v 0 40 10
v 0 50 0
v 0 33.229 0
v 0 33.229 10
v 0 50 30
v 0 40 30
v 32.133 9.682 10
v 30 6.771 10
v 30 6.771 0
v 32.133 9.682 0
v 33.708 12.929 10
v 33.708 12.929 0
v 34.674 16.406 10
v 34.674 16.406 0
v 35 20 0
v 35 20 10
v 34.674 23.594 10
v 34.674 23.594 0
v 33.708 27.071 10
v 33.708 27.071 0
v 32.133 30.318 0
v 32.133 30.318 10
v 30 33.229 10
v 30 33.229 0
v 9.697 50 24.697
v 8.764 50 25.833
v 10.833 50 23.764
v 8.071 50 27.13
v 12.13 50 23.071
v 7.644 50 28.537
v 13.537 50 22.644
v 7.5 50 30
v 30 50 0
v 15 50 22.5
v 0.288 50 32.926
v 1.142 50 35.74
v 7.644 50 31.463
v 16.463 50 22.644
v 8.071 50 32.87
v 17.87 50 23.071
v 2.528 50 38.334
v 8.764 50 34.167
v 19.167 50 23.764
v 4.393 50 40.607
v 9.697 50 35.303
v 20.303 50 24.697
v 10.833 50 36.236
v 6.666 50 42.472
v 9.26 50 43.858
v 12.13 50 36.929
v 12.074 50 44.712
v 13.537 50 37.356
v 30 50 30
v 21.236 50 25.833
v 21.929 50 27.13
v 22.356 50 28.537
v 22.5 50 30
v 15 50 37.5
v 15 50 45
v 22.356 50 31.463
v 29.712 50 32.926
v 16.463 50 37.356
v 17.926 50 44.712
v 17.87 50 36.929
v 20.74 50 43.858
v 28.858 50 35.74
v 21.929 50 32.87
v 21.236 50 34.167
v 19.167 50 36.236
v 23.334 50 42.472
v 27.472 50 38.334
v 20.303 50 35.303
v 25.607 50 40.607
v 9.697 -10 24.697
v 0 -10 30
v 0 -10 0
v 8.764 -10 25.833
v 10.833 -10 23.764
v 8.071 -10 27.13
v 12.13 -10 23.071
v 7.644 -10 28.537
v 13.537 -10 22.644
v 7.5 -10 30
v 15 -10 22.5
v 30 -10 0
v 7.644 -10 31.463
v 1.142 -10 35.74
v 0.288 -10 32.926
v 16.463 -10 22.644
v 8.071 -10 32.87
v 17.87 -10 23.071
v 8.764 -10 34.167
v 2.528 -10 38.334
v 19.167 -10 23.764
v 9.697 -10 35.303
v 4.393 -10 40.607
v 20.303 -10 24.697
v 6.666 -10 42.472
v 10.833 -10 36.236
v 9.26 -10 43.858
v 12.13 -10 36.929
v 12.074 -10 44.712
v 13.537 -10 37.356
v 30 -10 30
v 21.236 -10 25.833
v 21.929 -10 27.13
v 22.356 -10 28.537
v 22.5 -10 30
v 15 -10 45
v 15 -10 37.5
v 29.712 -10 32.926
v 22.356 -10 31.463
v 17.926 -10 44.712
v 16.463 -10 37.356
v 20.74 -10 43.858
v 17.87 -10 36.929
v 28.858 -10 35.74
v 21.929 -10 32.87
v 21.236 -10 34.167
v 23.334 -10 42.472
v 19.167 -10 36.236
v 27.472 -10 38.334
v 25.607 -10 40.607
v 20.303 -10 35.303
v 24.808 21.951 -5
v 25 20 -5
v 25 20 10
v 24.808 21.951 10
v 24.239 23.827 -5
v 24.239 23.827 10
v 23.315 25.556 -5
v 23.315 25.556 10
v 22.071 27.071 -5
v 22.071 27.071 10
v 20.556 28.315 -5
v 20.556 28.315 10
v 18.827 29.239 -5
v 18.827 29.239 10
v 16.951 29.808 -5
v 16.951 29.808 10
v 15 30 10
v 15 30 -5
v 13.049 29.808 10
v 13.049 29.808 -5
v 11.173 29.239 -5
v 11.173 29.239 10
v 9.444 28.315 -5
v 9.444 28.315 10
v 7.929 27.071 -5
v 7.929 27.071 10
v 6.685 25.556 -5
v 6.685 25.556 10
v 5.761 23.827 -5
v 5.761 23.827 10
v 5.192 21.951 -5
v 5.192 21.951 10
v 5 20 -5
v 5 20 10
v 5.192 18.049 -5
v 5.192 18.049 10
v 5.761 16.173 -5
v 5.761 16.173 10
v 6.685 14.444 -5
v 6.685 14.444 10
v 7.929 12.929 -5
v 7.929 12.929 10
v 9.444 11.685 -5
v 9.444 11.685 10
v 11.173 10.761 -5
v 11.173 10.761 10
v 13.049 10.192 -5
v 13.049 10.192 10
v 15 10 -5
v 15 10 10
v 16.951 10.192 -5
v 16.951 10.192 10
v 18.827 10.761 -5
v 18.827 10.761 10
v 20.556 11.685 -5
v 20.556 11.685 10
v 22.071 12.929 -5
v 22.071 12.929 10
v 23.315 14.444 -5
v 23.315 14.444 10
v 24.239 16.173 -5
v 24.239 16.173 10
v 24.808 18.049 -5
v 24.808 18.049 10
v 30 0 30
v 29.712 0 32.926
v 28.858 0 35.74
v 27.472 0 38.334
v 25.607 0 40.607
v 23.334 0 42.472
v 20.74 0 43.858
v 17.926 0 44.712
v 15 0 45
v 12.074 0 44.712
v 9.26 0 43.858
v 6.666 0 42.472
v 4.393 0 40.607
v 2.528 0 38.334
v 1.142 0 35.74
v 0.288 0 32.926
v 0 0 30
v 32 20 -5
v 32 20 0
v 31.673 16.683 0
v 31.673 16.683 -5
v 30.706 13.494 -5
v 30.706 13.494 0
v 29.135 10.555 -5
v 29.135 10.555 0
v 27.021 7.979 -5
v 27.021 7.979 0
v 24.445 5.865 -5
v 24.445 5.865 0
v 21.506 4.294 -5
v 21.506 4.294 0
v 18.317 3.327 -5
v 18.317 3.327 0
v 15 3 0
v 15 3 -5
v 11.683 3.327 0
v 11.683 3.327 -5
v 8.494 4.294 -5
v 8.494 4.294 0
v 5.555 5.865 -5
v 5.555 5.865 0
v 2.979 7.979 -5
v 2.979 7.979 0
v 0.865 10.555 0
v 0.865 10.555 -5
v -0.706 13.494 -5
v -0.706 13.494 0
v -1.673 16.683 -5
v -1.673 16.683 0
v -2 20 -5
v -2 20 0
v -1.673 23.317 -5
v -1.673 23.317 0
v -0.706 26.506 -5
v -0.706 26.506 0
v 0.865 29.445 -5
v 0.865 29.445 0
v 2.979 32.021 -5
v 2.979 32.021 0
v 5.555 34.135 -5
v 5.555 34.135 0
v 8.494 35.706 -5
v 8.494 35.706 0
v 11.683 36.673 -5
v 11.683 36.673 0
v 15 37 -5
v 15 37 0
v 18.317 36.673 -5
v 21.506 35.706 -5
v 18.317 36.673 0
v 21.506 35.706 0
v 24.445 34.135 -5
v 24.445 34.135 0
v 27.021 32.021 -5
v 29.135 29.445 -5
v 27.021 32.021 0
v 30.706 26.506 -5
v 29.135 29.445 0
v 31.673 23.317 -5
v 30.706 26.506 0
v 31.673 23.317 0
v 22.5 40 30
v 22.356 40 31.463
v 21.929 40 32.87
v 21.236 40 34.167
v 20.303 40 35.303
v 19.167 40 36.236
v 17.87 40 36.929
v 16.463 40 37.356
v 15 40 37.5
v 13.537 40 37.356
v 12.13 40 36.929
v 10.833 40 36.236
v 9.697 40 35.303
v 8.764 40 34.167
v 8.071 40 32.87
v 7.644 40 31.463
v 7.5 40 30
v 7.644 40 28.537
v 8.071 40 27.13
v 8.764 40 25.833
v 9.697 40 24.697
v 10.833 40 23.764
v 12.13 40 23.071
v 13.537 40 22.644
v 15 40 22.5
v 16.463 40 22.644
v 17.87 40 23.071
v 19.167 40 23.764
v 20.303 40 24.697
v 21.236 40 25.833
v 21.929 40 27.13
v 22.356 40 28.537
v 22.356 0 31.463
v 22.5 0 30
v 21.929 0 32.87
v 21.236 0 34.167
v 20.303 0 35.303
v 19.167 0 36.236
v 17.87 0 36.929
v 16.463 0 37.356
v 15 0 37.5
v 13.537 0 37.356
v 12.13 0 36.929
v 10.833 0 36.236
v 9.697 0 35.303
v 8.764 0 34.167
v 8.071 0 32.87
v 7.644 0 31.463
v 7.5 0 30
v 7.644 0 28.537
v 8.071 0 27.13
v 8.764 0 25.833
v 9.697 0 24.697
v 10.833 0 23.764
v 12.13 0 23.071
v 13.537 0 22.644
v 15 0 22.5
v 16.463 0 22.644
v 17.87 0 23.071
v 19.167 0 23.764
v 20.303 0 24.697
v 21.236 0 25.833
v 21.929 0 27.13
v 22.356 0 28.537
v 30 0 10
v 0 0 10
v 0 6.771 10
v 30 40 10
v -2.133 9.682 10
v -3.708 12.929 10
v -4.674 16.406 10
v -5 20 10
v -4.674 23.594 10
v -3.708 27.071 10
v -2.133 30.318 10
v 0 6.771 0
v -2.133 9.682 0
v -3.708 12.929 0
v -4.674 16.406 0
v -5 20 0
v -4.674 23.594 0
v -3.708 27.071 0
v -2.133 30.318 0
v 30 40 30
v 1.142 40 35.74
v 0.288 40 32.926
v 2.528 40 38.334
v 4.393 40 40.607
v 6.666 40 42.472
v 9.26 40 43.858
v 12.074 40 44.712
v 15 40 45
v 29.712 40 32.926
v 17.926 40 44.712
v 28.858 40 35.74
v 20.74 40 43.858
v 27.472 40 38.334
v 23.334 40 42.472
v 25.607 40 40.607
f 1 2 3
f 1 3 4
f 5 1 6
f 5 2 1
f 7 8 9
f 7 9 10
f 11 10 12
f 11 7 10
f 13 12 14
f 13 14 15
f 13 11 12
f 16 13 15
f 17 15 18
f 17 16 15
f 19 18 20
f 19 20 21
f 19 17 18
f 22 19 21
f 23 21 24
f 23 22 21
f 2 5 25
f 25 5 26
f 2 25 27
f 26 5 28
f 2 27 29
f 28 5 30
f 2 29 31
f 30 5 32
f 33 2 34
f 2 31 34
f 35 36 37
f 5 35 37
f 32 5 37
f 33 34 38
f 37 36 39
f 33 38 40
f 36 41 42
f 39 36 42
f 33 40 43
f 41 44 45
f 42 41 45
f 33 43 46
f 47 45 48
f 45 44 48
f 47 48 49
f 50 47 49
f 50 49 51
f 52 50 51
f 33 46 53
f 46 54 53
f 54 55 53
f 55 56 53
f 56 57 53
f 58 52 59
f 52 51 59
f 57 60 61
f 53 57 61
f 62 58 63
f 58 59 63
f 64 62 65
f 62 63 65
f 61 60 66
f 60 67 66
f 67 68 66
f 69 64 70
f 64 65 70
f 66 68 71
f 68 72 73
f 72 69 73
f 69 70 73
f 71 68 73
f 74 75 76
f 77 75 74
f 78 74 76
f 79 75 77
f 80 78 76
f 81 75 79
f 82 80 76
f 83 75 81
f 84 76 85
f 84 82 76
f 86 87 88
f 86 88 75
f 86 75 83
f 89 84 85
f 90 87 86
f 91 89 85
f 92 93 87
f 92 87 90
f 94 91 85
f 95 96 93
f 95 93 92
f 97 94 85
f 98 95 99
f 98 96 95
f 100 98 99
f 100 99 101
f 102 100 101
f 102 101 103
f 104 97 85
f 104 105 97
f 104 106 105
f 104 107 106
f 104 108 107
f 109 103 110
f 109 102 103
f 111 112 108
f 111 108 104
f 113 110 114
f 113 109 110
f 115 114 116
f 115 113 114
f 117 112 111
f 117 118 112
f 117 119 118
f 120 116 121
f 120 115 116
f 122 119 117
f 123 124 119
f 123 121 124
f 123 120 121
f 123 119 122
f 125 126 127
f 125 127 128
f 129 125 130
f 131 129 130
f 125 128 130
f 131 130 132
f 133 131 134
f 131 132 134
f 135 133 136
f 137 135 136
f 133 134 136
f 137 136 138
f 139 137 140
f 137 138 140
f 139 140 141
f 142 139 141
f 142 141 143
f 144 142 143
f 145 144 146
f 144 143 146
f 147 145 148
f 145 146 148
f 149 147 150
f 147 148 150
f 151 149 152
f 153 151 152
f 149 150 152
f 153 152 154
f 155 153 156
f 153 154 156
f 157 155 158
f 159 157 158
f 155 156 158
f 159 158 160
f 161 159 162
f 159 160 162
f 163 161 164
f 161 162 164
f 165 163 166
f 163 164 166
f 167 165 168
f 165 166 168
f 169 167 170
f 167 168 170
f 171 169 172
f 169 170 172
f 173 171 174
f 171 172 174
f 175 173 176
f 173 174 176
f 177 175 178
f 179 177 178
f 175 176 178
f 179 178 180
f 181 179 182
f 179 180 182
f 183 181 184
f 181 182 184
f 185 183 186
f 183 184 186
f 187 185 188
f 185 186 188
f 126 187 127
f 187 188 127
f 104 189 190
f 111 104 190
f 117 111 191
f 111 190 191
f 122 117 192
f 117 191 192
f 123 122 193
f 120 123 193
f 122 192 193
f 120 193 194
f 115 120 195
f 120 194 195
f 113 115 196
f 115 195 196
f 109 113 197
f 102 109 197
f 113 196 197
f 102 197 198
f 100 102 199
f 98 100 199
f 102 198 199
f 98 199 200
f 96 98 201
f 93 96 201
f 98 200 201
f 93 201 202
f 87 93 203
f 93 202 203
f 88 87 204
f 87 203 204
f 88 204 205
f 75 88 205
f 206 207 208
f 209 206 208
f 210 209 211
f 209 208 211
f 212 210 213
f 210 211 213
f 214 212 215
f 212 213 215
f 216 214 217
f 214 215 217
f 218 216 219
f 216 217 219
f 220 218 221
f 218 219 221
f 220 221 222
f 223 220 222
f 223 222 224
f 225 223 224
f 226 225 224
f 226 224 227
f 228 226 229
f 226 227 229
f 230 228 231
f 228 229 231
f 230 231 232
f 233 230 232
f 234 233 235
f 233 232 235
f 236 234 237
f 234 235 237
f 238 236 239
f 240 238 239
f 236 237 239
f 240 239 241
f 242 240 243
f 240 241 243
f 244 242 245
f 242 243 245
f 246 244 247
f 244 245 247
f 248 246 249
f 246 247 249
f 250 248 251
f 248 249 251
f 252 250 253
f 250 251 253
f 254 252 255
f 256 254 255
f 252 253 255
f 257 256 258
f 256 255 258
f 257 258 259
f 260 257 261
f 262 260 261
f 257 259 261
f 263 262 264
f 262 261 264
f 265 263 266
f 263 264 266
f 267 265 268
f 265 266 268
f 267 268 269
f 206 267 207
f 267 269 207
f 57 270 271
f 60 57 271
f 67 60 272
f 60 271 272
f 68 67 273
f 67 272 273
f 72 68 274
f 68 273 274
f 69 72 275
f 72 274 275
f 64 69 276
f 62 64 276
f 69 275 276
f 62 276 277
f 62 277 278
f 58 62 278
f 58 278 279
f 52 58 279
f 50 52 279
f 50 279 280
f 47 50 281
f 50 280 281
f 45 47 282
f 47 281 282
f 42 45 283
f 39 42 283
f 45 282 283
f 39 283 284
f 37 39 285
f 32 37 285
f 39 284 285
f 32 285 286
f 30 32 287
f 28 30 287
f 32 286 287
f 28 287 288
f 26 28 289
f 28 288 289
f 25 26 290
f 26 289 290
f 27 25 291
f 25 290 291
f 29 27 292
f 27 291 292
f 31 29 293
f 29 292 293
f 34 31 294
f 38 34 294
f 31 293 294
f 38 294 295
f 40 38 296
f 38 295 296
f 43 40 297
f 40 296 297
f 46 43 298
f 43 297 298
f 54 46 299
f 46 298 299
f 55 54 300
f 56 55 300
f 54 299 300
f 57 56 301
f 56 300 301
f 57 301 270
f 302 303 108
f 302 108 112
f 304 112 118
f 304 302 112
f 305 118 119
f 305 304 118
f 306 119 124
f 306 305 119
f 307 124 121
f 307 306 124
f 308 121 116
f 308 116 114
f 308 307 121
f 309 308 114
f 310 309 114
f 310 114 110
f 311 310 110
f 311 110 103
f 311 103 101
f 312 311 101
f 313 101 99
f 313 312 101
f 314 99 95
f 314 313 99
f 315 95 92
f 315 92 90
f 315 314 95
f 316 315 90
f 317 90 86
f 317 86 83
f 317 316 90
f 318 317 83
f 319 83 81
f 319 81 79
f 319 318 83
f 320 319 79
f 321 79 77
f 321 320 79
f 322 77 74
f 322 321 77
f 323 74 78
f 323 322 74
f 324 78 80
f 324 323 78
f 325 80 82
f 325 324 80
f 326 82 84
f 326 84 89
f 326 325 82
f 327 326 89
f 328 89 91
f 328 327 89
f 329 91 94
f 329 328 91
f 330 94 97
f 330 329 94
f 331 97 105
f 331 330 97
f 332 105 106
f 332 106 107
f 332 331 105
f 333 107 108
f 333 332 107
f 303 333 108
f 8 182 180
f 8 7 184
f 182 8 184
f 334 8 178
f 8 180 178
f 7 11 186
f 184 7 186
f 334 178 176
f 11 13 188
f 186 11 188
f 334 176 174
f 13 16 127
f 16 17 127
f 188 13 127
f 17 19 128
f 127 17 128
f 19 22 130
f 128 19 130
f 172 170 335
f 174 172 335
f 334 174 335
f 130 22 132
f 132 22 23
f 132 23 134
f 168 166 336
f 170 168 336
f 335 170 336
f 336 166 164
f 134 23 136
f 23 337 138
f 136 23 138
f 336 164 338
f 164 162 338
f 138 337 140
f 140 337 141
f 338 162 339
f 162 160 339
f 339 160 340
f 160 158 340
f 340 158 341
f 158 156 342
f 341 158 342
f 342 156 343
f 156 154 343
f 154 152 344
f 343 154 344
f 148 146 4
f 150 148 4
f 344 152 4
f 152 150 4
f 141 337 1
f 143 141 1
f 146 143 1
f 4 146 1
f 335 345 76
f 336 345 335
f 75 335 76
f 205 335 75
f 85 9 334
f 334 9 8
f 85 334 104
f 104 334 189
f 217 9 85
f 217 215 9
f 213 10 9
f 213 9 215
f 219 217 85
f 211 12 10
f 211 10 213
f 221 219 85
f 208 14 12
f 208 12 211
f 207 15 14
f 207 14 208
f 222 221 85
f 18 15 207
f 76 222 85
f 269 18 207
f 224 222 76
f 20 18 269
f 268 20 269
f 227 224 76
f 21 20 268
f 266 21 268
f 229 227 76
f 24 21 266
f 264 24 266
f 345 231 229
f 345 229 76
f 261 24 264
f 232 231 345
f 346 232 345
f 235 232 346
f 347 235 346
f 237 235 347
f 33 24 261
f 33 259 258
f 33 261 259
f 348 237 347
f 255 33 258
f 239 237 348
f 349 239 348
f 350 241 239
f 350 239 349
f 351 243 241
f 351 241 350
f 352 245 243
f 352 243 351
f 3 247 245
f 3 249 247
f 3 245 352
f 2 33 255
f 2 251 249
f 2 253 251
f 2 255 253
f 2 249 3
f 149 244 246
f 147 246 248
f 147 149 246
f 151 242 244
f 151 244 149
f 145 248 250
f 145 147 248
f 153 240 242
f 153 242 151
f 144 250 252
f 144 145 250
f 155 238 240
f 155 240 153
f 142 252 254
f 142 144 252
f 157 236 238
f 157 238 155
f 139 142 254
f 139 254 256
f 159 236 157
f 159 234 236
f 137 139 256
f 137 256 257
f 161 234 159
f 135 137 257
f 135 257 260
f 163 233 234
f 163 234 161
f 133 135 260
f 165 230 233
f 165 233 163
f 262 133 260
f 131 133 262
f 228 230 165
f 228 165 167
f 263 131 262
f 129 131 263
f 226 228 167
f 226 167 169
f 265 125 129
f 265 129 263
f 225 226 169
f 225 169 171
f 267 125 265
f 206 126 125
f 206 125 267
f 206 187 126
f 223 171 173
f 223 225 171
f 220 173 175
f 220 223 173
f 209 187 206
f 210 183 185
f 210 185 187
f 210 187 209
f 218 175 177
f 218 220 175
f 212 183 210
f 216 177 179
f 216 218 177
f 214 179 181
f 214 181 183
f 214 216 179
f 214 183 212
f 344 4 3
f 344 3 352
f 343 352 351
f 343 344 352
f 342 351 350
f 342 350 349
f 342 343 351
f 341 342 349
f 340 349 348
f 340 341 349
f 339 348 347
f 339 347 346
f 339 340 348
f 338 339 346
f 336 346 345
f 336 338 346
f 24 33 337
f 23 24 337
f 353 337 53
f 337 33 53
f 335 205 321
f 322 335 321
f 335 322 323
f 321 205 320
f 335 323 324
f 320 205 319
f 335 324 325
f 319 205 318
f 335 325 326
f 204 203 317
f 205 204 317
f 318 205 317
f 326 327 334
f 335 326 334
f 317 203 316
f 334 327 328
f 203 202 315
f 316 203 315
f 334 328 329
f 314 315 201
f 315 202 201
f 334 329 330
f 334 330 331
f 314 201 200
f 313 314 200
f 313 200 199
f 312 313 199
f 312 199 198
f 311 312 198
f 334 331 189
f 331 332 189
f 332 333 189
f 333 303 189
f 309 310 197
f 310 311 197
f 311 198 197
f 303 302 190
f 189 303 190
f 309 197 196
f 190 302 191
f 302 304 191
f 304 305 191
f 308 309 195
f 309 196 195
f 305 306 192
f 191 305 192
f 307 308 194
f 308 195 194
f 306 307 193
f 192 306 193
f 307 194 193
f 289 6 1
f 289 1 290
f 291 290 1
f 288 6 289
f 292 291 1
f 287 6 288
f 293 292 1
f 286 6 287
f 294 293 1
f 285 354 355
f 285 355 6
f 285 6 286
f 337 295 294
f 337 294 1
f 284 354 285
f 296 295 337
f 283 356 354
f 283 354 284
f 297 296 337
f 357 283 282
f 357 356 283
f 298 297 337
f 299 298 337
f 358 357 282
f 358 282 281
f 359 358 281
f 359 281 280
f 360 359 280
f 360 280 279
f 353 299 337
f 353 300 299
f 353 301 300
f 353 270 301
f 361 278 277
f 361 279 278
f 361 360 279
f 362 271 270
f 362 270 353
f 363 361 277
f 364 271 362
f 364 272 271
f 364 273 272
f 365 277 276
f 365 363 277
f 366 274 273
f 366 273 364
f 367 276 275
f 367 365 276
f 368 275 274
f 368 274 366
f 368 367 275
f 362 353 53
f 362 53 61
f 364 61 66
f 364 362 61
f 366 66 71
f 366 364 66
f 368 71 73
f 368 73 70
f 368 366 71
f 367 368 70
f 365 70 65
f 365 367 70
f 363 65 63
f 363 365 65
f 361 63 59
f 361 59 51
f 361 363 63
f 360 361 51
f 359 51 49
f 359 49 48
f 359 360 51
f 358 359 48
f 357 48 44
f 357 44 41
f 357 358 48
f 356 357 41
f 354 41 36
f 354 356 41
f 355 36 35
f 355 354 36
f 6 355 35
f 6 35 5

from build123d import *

# Parameters (mm, degrees)
F0_R      = 7.5
F1_DEPTH  = 10
F2_W      = 30
F2_H      = 10
F3_DEPTH  = 5
F6_DEPTH  = 30
F7_R      = 10
F8_DEPTH  = 10
F10_DEPTH = 10
F11_R     = 17
F12_DEPTH = 5
F13_DEPTH = 5


with BuildPart() as f1:
    # F0 (on Front) → F1 (new body)
    with BuildSketch(Plane.XZ):
        with BuildLine():
            Line((0, 30), (0, 0))
            Line((0, 0), (30, 0))
            Line((30, 0), (30, 30))
            ThreePointArc((30, 30), (15, 45), (0, 30))
        make_face()
        with Locations((15, 30)):
            Circle(F0_R, mode=Mode.SUBTRACT)
    extrude(amount=F1_DEPTH)

    # F2 (on face) → F3 (join)
    with BuildSketch(Plane(origin=(0, 0, 0), x_dir=(-1, 0, 0), z_dir=(0, 1, 0))):
        with Locations((-15, 5)):
            Rectangle(F2_W, F2_H)
    extrude(amount=F3_DEPTH)


with BuildPart() as f5_1:
    # F5: instance of F1
    add(f1.part.mirror(Plane(origin=(15, 20, 5), x_dir=(-1, 0, 0), z_dir=(0, 1, 0))))


with BuildPart() as f1_1:
    add(f1.part)

    # F6 (add, through all): a face of the model
    f6_faces = [f5_1.part.faces().sort_by_distance(p)[0] for p in [
        (15, 35, 5),
    ]]

    add(f5_1.part)  # F6 merges F5_1
    extrude(f6_faces, amount=F6_DEPTH)

    # F7 (on face) → F8 (cut, through all)
    with BuildSketch(Plane.XY.offset(10)):
        with Locations((15, 20)):
            Circle(F7_R)
    extrude(amount=-F8_DEPTH, mode=Mode.SUBTRACT)

    # F9 (on face) → F10 (join)
    with BuildSketch(Plane.XY.offset(10)):
        with BuildLine():
            Line((0, 6.7712434447), (0, 33.2287565553))
            ThreePointArc((0, 33.2287565553), (-5, 20), (0, 6.7712434447))
        make_face()
        with BuildLine():
            ThreePointArc((30, 6.7712434447), (35, 20), (30, 33.2287565553))
            Line((30, 33.2287565553), (30, 6.7712434447))
        make_face()
    extrude(amount=-F10_DEPTH)

    # F11 (on face) → F12 (join)
    with BuildSketch(Plane(origin=(0, 0, 0), x_dir=(1, 0, 0), z_dir=(0, 0, -1))):
        with Locations((15, -20)):
            Circle(F11_R)
    extrude(amount=F12_DEPTH)

    # F13 (cut, through all): a face of the model
    f13_faces = [f1_1.faces().sort_by_distance(p)[0] for p in [
        (15, 20, 0),
    ]]
    extrude(f13_faces, amount=-F13_DEPTH, mode=Mode.SUBTRACT)


solid = f1_1.part
